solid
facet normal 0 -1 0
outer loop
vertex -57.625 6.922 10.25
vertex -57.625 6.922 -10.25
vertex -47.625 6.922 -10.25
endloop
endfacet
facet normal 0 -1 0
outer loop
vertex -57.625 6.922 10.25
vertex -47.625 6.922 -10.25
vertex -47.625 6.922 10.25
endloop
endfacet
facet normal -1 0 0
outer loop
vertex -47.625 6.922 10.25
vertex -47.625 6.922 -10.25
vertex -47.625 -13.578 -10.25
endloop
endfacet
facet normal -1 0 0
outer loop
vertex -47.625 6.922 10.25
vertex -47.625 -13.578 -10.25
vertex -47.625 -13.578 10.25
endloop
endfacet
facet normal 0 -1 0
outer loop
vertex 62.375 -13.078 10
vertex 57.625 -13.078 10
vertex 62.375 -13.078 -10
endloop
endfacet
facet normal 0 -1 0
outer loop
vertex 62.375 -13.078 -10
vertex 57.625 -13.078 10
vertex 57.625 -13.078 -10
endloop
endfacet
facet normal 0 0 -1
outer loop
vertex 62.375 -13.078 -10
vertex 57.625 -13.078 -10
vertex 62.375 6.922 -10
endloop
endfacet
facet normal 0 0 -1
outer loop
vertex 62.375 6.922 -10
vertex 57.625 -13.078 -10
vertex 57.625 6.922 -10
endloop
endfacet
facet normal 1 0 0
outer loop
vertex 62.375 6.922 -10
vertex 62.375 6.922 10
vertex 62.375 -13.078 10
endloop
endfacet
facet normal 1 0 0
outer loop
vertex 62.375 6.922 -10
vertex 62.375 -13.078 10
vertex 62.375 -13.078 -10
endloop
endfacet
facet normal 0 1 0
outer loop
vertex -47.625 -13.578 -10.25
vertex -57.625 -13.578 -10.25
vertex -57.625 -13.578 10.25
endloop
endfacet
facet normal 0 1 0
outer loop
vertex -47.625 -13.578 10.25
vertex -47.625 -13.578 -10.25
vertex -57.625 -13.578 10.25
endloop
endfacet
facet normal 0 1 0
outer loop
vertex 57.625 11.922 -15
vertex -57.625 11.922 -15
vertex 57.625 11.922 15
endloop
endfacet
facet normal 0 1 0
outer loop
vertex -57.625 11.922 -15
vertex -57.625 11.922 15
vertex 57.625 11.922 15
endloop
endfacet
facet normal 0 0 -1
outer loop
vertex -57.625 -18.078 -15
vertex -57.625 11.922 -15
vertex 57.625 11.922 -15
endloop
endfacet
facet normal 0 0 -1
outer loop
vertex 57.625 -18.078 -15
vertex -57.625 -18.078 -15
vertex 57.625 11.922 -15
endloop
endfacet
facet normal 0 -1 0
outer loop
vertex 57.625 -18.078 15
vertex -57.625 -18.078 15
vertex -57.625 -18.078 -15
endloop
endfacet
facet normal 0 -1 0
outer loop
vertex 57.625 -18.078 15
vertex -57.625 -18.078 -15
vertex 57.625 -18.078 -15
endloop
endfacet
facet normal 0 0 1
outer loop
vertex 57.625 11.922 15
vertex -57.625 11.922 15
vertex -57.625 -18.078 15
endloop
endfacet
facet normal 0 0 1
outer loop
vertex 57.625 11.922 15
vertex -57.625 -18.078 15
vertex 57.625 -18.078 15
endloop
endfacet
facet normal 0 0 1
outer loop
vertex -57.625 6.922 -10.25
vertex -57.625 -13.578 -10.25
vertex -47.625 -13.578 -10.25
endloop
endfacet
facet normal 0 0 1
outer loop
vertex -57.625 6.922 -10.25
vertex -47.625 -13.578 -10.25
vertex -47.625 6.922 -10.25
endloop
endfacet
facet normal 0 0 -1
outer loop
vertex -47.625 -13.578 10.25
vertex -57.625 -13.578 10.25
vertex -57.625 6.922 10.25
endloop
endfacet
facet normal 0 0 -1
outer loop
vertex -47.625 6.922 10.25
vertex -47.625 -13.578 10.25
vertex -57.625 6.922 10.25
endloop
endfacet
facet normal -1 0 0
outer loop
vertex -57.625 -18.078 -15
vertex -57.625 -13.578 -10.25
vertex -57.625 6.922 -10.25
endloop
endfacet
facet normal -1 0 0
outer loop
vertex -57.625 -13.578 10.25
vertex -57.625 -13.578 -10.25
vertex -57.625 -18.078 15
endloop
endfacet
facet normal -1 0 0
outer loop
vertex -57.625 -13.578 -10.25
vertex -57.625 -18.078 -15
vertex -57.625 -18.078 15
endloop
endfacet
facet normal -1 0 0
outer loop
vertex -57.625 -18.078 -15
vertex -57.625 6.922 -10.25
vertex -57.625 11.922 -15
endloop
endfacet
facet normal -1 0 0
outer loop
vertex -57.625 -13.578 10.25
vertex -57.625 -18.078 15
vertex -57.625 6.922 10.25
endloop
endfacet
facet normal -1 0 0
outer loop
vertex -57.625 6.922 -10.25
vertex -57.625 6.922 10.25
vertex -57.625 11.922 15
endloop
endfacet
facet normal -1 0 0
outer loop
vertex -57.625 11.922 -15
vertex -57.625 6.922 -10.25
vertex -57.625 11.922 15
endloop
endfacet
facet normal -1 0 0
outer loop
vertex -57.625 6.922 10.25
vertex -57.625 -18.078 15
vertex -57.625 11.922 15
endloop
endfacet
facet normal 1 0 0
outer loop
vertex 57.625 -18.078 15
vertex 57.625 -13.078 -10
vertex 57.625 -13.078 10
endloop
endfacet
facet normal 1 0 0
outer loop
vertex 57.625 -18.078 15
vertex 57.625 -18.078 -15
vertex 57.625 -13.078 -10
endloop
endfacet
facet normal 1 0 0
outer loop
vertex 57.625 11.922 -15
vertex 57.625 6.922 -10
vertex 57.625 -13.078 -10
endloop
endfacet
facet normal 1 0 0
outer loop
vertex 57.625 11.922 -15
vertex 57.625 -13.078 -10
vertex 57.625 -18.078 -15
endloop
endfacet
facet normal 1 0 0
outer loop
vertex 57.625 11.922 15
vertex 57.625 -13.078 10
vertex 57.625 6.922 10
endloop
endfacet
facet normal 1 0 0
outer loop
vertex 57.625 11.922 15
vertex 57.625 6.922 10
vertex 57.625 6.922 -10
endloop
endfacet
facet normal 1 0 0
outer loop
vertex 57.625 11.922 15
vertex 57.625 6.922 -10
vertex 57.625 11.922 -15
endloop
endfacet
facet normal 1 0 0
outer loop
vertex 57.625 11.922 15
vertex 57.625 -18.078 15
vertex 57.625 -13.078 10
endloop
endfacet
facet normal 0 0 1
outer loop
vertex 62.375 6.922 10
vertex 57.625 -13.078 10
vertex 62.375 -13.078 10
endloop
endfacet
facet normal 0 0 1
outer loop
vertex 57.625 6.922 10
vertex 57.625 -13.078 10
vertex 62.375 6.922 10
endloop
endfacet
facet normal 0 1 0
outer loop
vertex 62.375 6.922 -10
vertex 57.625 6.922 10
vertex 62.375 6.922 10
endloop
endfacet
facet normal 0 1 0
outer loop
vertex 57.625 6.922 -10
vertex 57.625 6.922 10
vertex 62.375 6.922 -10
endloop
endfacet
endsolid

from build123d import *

# Parameters (mm, degrees)
SKETCH1_W           = 115.25
SKETCH1_H           = 30
BOSS_EXTRUDE1_DEPTH = 15
SKETCH2_W           = 20.5
SKETCH2_H           = 20.5
CUT_EXTRUDE2_DEPTH  = 10
SKETCH3_W           = 20
SKETCH3_H           = 20
BOSS_EXTRUDE2_DEPTH = 4.75


with BuildPart() as part:
    # Sketch1 → Boss-Extrude1 (new, symmetric)
    with BuildSketch(Plane.XY):
        with Locations((0, -3.077586207)):
            Rectangle(SKETCH1_W, SKETCH1_H)
    extrude(amount=BOSS_EXTRUDE1_DEPTH, both=True)

    # Sketch2 → Cut-Extrude2 (cut)
    with BuildSketch(Plane.ZY.offset(57.625)):
        with Locations((0, -3.327586207)):
            Rectangle(SKETCH2_W, SKETCH2_H)
    extrude(amount=-CUT_EXTRUDE2_DEPTH, mode=Mode.SUBTRACT)

    # Sketch3 → Boss-Extrude2 (add)
    with BuildSketch(Plane(origin=(57.625, 0, 0), x_dir=(0, 0, -1), z_dir=(1, 0, 0))):
        with Locations((0, -3.077586207)):
            Rectangle(SKETCH3_W, SKETCH3_H)
    extrude(amount=BOSS_EXTRUDE2_DEPTH)


solid = part.part
